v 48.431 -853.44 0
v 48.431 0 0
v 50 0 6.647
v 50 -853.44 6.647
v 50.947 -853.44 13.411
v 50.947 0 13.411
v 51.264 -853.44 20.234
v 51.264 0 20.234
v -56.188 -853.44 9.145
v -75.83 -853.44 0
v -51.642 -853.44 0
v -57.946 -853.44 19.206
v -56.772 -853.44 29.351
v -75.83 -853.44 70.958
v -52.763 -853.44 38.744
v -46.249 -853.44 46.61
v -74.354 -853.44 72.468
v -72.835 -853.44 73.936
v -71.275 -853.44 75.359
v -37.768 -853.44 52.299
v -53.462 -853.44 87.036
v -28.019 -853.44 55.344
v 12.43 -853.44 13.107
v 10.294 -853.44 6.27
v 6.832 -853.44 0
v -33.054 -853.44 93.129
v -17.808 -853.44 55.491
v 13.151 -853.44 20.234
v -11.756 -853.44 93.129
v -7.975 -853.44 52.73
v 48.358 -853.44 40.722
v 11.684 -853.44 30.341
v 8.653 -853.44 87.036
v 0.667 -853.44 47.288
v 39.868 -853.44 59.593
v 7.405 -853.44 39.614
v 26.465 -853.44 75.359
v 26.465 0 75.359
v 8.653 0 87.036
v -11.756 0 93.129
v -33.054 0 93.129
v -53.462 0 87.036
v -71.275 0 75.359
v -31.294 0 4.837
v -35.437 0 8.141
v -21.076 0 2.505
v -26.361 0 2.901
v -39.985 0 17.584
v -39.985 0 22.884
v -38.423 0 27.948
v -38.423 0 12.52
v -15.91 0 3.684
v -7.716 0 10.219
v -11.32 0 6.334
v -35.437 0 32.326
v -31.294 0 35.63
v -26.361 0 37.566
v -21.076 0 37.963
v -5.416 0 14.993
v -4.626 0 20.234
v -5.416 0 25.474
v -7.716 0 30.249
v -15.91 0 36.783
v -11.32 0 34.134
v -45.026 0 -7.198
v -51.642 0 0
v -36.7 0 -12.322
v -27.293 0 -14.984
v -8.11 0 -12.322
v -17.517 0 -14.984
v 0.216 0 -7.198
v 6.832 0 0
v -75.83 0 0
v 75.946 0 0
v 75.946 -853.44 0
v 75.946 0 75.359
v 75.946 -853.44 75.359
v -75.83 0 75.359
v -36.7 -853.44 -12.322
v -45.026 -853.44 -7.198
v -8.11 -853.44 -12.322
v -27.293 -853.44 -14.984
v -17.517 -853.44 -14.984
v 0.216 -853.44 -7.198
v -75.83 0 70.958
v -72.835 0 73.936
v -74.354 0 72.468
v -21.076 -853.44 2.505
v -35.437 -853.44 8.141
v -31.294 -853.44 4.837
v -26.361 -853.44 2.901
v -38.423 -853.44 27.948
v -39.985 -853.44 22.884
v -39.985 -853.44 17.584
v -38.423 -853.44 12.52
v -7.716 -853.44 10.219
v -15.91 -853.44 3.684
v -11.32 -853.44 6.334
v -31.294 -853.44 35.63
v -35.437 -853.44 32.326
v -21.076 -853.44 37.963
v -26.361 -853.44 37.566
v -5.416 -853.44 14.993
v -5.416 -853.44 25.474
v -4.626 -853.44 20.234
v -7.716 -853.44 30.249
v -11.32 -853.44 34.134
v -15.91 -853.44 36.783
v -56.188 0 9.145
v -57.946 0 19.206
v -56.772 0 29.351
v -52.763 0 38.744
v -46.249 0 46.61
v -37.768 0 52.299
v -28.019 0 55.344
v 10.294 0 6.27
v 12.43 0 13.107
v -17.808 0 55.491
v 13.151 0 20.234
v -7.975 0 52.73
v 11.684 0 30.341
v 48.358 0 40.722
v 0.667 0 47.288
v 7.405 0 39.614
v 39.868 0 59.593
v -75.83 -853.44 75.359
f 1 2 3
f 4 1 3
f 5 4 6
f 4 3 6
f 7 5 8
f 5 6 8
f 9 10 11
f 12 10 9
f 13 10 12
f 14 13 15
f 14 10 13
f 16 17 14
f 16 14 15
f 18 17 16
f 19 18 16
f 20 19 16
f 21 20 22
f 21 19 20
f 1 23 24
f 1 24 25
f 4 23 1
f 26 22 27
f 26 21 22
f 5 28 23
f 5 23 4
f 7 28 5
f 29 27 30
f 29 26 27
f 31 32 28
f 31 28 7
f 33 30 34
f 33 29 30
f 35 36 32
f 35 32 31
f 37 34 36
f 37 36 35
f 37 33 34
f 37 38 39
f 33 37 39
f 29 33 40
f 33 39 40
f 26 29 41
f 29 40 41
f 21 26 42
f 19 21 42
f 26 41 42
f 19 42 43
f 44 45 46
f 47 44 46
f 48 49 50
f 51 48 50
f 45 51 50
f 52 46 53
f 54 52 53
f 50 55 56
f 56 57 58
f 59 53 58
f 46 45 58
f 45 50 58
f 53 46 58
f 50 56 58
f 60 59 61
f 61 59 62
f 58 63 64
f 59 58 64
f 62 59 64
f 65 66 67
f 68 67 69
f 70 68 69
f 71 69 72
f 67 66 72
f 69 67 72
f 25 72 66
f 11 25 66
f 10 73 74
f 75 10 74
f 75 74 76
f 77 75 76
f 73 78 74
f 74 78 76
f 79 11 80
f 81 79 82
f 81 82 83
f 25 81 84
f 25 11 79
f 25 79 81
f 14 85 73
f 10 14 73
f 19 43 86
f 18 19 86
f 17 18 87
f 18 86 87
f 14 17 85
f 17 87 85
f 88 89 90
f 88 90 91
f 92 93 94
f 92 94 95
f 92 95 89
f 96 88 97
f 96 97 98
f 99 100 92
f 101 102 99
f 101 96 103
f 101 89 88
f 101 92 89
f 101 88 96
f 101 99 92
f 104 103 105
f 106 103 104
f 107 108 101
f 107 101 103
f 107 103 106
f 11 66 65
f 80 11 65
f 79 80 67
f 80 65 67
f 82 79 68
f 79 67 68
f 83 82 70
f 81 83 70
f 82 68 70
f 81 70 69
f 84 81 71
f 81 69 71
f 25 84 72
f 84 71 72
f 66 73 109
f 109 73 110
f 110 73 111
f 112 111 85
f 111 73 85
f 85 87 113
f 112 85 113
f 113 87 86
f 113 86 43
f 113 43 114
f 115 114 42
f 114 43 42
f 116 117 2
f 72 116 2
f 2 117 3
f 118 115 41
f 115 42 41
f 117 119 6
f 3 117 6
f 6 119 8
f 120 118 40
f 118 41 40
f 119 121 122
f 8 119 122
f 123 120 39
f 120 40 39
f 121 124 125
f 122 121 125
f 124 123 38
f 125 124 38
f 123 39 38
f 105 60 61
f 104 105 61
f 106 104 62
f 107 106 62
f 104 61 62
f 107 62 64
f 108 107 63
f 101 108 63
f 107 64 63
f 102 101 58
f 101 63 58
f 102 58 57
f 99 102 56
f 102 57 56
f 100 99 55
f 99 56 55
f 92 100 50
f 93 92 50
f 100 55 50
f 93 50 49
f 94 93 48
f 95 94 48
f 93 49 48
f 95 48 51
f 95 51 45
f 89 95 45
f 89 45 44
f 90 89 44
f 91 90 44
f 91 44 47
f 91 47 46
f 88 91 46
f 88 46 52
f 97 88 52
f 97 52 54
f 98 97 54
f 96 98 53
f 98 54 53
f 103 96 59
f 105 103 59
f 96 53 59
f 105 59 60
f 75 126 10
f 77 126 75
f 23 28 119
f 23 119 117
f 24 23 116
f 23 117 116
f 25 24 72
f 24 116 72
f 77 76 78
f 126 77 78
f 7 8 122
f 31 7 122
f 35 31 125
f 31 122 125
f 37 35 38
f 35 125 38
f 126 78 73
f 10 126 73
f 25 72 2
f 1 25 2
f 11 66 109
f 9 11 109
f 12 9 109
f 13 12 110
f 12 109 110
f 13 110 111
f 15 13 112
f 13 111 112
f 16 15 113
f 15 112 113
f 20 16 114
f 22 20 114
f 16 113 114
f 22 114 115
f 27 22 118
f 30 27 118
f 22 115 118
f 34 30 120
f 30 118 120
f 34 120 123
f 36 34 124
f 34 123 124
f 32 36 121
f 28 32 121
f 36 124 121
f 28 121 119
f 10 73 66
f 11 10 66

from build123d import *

# Parameters (mm, degrees)
F2_DEPTH = 853.44
F1_R     = 17.7784679127
F1_R_2   = 5.4008341776


with BuildPart() as f2:
    # F1 (on face) → F2 (new body)
    with BuildSketch(Plane.XZ):
        with BuildLine():
            ThreePointArc((48.4309140372, 0), (50.5523481369, 10.0181918325), (51.2640769277, 20.2337726951))
            ThreePointArc((51.2640769277, 20.2337726951), (44.7788719586, 50.4572540277), (26.465064381, 75.3594860435))
            Line((26.465064381, 75.3594860435), (-71.2748453959, 75.3594860435))
            ThreePointArc((-71.2748453959, 75.3594860435), (-73.5996015704, 73.2075239512), (-75.8296921849, 70.9576066263))
            Line((-75.8296921849, 70.9576066263), (-75.8296921849, 0))
            Line((-75.8296921849, 0), (-51.6421061342, 0))
            ThreePointArc((-51.6421061342, 0), (-33.0036053989, 54.1732420152), (13.150985731, 20.2337726951))
            ThreePointArc((13.150985731, 20.2337726951), (11.5345788127, 9.6350578036), (6.8323251193, 0))
            Line((6.8323251193, 0), (48.4309140372, 0))
        make_face()
        with BuildLine():
            Line((-71.2748453959, 75.3594860435), (26.465064381, 75.3594860435))
            ThreePointArc((26.465064381, 75.3594860435), (-22.4048905075, 93.9027401302), (-71.2748453959, 75.3594860435))
        make_face()
    extrude(amount=F2_DEPTH)


with BuildPart() as f2b:
    # F1 (on face) → F2, piece 2 (new body)
    with BuildSketch(Plane.XZ):
        with Locations((-22.4048905075, 20.2337726951)):
            Circle(F1_R)
        with Locations((-22.4048905075, 20.2337726951)):
            Circle(F1_R_2, mode=Mode.SUBTRACT)
        with Locations((-22.4048905075, 20.2337726951)):
            Circle(F1_R_2)
    extrude(amount=F2_DEPTH)


with BuildPart() as f2c:
    # F1 (on face) → F2, piece 3 (new body)
    with BuildSketch(Plane.XZ):
        with BuildLine():
            ThreePointArc((-51.6421061342, 0), (-22.4048905075, -15.3221035433), (6.8323251193, 0))
            Line((6.8323251193, 0), (0, 0))
            Line((0, 0), (-51.6421061342, 0))
        make_face()
    extrude(amount=F2_DEPTH)


with BuildPart() as f2d:
    # F0 (on Front) → F2, piece 4 (new body)
    with BuildSketch(Plane.XZ):
        Polygon((-75.8296921849, 0), (0, 0), (75.9462192655, 0), (75.9462192655, 75.3594860435), (-75.8296921849, 75.3594860435), align=None)
    extrude(amount=F2_DEPTH)


solid = Compound([f2.part, f2b.part, f2c.part, f2d.part])
